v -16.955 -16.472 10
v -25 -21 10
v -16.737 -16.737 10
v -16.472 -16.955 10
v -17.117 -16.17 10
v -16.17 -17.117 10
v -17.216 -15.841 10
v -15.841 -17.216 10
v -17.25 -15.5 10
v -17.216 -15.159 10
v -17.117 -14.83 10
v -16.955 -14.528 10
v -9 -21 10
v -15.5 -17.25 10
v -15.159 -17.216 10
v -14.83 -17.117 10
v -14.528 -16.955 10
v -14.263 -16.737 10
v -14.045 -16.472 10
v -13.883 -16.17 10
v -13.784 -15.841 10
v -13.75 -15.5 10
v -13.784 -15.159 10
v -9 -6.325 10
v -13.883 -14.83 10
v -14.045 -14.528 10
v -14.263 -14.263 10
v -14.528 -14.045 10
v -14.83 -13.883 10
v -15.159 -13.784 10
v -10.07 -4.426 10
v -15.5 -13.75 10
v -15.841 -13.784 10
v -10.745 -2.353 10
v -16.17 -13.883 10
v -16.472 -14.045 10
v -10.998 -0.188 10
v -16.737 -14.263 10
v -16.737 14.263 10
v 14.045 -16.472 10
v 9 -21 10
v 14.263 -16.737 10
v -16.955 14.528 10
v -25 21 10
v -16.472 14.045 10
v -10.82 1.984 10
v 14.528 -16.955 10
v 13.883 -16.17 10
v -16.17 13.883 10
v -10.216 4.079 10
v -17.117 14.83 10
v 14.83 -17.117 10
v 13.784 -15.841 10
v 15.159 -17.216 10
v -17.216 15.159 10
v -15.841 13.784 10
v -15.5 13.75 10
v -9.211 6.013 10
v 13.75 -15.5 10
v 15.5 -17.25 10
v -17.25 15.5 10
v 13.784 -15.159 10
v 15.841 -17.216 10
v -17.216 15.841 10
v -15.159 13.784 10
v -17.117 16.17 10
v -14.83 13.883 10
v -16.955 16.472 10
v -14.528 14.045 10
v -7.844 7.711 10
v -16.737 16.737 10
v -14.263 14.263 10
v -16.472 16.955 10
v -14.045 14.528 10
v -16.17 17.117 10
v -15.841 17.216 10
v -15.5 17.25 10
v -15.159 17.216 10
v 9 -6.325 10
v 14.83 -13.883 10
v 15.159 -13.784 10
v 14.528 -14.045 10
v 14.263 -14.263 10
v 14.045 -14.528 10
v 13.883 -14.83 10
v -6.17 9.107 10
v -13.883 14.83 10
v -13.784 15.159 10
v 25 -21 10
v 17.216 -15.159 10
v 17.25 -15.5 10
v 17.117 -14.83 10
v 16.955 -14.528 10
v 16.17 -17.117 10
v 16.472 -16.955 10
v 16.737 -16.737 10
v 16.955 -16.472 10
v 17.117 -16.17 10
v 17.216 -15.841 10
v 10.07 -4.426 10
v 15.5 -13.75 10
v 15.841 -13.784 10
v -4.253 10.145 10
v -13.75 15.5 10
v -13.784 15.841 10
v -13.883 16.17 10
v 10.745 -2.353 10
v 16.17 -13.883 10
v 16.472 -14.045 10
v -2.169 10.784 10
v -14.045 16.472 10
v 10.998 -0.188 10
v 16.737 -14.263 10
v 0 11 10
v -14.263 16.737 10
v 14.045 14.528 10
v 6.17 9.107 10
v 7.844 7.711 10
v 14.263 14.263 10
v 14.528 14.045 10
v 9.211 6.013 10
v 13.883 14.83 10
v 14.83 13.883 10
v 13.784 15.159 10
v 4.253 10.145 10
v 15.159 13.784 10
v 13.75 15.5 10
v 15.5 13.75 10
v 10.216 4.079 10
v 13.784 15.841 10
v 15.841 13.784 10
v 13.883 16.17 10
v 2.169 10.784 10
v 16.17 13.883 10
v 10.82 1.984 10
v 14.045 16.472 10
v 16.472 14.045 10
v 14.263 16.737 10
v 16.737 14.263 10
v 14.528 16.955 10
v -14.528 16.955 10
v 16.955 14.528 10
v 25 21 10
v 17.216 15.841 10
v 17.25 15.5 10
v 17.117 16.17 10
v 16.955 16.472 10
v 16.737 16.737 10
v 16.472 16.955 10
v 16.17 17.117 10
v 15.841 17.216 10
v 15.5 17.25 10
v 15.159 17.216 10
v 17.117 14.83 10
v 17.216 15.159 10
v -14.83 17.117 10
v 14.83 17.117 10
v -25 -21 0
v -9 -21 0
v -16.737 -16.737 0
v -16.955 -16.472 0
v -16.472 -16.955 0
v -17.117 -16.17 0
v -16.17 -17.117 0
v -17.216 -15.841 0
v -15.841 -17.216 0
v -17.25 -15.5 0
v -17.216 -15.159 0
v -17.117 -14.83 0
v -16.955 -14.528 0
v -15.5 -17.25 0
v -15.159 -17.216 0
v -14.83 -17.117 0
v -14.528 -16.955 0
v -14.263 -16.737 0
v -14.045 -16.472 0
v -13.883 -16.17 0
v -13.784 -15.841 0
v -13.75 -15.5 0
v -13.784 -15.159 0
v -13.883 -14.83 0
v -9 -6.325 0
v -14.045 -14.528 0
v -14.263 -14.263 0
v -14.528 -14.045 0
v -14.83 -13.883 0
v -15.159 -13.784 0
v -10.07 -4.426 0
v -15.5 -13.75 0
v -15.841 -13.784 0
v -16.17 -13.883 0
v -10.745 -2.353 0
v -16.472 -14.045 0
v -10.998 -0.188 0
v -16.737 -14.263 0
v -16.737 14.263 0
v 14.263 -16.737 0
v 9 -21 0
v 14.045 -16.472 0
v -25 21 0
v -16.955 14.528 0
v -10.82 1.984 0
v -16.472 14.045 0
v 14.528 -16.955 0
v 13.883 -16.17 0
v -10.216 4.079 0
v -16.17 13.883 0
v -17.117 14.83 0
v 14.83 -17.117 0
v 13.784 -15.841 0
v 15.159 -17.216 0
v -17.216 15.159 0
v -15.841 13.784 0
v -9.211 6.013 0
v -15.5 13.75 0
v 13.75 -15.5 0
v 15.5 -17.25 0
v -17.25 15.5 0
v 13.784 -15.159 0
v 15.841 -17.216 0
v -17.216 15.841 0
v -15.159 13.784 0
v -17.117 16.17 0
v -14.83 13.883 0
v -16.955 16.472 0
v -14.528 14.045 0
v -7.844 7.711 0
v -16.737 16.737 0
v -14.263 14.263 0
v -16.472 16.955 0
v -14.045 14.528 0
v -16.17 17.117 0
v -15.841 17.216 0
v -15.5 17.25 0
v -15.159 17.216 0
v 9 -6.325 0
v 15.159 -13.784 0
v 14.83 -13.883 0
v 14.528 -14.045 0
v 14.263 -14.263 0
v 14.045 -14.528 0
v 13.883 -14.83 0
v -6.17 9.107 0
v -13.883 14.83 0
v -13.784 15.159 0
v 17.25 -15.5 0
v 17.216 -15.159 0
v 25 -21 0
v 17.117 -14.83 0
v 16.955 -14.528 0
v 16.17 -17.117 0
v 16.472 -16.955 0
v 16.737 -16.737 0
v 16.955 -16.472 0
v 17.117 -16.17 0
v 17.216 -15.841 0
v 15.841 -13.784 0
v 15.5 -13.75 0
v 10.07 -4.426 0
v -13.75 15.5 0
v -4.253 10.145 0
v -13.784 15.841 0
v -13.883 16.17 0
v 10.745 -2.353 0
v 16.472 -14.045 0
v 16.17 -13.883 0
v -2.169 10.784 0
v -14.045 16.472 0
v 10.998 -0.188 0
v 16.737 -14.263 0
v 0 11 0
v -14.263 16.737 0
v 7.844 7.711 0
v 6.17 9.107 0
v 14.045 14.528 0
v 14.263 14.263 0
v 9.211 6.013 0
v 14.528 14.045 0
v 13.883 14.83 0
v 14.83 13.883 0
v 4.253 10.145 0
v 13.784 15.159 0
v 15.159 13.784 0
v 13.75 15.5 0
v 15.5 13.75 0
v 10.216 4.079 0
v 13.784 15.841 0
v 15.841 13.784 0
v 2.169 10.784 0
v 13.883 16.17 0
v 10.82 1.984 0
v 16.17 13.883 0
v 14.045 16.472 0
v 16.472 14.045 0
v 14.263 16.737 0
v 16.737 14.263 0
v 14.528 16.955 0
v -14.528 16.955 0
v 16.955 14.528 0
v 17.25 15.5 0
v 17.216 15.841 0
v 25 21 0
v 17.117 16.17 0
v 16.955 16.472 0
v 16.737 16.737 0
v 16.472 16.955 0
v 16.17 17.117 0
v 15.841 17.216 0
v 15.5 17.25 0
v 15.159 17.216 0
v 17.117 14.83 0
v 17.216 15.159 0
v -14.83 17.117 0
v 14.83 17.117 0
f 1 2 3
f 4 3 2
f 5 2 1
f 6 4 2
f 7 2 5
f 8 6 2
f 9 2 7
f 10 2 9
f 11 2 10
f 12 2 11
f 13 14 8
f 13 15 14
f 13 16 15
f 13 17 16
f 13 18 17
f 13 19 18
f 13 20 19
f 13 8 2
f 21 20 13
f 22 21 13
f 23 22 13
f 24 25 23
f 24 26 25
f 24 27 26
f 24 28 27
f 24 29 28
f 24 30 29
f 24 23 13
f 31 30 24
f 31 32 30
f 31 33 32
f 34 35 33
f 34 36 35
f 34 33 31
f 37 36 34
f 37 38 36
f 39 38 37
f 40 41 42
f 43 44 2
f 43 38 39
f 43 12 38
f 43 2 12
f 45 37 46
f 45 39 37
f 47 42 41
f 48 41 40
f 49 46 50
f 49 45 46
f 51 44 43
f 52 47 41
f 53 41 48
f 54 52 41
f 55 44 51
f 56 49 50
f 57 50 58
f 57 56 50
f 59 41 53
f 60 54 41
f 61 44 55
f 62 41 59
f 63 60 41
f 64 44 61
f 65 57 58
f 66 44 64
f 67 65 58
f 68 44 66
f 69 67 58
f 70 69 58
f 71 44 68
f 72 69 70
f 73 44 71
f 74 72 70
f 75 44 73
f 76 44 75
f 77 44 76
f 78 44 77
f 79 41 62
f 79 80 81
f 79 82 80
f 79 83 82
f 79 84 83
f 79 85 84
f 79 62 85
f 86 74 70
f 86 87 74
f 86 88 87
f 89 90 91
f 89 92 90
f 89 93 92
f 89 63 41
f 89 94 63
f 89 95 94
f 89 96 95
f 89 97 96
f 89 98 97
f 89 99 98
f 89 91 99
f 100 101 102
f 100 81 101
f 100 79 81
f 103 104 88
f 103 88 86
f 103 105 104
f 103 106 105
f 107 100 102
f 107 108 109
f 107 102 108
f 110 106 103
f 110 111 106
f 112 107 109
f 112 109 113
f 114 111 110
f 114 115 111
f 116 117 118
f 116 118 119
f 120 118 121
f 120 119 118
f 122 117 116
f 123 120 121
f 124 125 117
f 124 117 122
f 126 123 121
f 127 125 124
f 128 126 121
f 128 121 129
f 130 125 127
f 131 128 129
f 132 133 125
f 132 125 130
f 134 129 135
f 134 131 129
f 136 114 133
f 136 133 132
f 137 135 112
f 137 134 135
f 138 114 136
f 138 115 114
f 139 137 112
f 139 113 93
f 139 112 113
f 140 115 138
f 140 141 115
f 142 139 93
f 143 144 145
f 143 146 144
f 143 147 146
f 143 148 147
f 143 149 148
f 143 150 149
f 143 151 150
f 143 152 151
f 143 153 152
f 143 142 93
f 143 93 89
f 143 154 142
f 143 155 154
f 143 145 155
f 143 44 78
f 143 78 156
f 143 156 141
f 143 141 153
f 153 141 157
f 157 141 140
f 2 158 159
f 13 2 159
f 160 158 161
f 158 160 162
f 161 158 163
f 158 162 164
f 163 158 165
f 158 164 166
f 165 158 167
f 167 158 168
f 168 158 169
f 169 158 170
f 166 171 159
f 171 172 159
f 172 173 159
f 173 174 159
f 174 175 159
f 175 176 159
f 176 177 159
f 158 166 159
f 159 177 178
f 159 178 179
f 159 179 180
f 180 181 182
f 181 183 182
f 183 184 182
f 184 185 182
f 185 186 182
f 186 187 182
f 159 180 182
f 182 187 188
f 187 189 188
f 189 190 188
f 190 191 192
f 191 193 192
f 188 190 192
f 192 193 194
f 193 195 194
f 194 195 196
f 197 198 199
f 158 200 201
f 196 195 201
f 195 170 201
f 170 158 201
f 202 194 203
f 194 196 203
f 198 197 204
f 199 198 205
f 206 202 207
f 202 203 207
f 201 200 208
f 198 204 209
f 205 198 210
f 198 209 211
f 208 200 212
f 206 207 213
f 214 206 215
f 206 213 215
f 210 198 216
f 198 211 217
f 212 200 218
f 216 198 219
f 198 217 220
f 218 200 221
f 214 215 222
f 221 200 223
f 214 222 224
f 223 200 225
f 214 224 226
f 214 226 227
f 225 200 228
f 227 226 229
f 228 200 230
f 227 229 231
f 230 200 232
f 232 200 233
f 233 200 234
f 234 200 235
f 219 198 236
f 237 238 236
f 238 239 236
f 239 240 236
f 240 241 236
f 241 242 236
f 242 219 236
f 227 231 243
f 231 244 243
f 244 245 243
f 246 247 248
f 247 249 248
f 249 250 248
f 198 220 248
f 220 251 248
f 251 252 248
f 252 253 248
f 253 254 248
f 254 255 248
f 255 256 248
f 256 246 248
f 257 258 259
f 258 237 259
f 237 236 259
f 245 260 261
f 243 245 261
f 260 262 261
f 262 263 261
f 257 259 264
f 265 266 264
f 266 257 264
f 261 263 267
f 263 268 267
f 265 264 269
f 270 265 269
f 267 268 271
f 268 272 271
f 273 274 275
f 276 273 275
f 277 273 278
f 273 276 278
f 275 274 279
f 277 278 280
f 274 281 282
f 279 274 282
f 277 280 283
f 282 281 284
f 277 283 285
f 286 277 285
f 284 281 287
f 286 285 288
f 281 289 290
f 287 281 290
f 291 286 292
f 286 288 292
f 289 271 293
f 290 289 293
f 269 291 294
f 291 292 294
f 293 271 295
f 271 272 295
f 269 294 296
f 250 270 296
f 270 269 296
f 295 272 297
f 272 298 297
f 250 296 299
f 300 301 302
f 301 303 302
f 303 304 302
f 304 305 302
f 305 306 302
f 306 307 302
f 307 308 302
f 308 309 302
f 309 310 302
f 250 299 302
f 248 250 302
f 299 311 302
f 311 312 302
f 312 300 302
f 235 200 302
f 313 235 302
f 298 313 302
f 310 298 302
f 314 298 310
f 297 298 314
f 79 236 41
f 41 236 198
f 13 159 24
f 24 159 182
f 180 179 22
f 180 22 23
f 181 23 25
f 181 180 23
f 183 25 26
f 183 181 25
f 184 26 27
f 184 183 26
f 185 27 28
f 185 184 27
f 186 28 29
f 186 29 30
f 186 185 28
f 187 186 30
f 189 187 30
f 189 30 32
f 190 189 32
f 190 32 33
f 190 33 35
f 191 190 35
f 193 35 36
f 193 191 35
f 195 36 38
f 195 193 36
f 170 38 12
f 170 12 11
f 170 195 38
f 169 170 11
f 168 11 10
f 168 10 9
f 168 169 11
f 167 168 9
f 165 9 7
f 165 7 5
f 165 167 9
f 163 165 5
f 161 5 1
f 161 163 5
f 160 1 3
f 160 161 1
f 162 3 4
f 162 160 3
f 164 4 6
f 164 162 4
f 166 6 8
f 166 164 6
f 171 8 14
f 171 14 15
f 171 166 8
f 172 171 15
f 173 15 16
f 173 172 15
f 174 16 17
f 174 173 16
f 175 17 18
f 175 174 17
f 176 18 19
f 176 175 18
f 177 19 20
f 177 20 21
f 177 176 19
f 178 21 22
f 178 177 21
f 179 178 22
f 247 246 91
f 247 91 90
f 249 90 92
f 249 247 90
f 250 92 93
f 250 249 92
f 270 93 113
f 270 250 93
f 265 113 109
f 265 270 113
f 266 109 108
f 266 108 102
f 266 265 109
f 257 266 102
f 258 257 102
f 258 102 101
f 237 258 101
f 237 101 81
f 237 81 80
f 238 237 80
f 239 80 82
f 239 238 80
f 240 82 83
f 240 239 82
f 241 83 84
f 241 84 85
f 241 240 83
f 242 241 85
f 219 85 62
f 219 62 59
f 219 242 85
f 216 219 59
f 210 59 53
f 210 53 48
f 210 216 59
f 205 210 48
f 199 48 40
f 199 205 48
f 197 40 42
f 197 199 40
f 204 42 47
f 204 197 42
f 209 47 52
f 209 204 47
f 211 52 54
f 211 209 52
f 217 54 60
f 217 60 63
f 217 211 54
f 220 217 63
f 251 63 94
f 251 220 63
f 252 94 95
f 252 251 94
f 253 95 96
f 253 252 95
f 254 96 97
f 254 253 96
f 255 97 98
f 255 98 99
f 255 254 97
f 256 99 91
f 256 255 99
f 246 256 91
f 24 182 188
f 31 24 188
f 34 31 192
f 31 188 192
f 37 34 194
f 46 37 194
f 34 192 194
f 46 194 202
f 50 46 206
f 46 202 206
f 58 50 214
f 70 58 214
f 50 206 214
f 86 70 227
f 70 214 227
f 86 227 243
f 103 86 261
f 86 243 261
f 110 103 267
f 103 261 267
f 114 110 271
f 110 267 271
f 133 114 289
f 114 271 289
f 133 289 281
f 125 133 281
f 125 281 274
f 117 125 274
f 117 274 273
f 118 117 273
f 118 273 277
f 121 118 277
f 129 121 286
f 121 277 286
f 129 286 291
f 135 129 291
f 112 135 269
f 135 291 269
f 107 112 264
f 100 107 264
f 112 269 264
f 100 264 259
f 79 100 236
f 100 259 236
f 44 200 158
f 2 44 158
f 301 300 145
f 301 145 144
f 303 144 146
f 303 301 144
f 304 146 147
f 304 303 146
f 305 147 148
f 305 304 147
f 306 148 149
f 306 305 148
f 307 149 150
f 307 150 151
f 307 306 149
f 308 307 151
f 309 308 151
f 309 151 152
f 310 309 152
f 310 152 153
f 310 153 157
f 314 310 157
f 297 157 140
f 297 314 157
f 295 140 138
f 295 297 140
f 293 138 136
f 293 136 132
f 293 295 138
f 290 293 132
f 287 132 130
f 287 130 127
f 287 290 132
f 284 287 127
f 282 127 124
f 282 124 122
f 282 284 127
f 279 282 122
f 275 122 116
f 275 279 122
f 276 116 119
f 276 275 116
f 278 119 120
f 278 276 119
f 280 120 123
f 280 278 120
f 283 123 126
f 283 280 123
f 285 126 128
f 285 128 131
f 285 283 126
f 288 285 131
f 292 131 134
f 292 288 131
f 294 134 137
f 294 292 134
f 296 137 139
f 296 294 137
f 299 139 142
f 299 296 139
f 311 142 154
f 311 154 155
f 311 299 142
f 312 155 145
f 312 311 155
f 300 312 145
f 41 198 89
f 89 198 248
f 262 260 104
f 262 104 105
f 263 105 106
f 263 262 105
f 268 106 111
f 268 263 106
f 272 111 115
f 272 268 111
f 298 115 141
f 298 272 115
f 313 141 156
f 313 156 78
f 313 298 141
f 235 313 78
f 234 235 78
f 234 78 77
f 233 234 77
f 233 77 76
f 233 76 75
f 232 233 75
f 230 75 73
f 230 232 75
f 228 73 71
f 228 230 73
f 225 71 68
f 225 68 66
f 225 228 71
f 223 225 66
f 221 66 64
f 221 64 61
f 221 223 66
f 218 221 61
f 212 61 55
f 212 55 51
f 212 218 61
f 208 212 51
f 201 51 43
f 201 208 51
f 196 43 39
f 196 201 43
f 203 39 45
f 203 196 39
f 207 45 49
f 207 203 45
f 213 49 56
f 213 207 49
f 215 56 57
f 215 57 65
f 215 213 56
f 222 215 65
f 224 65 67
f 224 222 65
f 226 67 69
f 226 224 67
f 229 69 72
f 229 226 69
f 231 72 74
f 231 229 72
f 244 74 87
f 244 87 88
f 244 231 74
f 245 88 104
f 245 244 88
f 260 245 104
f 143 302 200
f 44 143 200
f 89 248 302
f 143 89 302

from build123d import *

# Parameters (mm, degrees)
F0_R     = 1.75
F1_DEPTH = 10


with BuildPart() as f1:
    # F0 (on Top) → F1 (new body)
    with BuildSketch(Plane.XY):
        with BuildLine():
            Line((25, 21), (-25, 21))
            Line((-25, 21), (-25, -21))
            Line((-25, -21), (-9, -21))
            Line((-9, -21), (-9, -6.324555))
            ThreePointArc((-9, -6.324555), (0, 11), (9, -6.324555))
            Line((9, -6.324555), (9, -21))
            Line((9, -21), (25, -21))
            Line((25, -21), (25, 21))
        make_face()
        with Locations((-15.5, -15.5)):
            Circle(F0_R, mode=Mode.SUBTRACT)
        with Locations((15.5, -15.5)):
            Circle(F0_R, mode=Mode.SUBTRACT)
        with Locations((-15.5, 15.5)):
            Circle(F0_R, mode=Mode.SUBTRACT)
        with Locations((15.5, 15.5)):
            Circle(F0_R, mode=Mode.SUBTRACT)
    extrude(amount=F1_DEPTH)


solid = f1.part
